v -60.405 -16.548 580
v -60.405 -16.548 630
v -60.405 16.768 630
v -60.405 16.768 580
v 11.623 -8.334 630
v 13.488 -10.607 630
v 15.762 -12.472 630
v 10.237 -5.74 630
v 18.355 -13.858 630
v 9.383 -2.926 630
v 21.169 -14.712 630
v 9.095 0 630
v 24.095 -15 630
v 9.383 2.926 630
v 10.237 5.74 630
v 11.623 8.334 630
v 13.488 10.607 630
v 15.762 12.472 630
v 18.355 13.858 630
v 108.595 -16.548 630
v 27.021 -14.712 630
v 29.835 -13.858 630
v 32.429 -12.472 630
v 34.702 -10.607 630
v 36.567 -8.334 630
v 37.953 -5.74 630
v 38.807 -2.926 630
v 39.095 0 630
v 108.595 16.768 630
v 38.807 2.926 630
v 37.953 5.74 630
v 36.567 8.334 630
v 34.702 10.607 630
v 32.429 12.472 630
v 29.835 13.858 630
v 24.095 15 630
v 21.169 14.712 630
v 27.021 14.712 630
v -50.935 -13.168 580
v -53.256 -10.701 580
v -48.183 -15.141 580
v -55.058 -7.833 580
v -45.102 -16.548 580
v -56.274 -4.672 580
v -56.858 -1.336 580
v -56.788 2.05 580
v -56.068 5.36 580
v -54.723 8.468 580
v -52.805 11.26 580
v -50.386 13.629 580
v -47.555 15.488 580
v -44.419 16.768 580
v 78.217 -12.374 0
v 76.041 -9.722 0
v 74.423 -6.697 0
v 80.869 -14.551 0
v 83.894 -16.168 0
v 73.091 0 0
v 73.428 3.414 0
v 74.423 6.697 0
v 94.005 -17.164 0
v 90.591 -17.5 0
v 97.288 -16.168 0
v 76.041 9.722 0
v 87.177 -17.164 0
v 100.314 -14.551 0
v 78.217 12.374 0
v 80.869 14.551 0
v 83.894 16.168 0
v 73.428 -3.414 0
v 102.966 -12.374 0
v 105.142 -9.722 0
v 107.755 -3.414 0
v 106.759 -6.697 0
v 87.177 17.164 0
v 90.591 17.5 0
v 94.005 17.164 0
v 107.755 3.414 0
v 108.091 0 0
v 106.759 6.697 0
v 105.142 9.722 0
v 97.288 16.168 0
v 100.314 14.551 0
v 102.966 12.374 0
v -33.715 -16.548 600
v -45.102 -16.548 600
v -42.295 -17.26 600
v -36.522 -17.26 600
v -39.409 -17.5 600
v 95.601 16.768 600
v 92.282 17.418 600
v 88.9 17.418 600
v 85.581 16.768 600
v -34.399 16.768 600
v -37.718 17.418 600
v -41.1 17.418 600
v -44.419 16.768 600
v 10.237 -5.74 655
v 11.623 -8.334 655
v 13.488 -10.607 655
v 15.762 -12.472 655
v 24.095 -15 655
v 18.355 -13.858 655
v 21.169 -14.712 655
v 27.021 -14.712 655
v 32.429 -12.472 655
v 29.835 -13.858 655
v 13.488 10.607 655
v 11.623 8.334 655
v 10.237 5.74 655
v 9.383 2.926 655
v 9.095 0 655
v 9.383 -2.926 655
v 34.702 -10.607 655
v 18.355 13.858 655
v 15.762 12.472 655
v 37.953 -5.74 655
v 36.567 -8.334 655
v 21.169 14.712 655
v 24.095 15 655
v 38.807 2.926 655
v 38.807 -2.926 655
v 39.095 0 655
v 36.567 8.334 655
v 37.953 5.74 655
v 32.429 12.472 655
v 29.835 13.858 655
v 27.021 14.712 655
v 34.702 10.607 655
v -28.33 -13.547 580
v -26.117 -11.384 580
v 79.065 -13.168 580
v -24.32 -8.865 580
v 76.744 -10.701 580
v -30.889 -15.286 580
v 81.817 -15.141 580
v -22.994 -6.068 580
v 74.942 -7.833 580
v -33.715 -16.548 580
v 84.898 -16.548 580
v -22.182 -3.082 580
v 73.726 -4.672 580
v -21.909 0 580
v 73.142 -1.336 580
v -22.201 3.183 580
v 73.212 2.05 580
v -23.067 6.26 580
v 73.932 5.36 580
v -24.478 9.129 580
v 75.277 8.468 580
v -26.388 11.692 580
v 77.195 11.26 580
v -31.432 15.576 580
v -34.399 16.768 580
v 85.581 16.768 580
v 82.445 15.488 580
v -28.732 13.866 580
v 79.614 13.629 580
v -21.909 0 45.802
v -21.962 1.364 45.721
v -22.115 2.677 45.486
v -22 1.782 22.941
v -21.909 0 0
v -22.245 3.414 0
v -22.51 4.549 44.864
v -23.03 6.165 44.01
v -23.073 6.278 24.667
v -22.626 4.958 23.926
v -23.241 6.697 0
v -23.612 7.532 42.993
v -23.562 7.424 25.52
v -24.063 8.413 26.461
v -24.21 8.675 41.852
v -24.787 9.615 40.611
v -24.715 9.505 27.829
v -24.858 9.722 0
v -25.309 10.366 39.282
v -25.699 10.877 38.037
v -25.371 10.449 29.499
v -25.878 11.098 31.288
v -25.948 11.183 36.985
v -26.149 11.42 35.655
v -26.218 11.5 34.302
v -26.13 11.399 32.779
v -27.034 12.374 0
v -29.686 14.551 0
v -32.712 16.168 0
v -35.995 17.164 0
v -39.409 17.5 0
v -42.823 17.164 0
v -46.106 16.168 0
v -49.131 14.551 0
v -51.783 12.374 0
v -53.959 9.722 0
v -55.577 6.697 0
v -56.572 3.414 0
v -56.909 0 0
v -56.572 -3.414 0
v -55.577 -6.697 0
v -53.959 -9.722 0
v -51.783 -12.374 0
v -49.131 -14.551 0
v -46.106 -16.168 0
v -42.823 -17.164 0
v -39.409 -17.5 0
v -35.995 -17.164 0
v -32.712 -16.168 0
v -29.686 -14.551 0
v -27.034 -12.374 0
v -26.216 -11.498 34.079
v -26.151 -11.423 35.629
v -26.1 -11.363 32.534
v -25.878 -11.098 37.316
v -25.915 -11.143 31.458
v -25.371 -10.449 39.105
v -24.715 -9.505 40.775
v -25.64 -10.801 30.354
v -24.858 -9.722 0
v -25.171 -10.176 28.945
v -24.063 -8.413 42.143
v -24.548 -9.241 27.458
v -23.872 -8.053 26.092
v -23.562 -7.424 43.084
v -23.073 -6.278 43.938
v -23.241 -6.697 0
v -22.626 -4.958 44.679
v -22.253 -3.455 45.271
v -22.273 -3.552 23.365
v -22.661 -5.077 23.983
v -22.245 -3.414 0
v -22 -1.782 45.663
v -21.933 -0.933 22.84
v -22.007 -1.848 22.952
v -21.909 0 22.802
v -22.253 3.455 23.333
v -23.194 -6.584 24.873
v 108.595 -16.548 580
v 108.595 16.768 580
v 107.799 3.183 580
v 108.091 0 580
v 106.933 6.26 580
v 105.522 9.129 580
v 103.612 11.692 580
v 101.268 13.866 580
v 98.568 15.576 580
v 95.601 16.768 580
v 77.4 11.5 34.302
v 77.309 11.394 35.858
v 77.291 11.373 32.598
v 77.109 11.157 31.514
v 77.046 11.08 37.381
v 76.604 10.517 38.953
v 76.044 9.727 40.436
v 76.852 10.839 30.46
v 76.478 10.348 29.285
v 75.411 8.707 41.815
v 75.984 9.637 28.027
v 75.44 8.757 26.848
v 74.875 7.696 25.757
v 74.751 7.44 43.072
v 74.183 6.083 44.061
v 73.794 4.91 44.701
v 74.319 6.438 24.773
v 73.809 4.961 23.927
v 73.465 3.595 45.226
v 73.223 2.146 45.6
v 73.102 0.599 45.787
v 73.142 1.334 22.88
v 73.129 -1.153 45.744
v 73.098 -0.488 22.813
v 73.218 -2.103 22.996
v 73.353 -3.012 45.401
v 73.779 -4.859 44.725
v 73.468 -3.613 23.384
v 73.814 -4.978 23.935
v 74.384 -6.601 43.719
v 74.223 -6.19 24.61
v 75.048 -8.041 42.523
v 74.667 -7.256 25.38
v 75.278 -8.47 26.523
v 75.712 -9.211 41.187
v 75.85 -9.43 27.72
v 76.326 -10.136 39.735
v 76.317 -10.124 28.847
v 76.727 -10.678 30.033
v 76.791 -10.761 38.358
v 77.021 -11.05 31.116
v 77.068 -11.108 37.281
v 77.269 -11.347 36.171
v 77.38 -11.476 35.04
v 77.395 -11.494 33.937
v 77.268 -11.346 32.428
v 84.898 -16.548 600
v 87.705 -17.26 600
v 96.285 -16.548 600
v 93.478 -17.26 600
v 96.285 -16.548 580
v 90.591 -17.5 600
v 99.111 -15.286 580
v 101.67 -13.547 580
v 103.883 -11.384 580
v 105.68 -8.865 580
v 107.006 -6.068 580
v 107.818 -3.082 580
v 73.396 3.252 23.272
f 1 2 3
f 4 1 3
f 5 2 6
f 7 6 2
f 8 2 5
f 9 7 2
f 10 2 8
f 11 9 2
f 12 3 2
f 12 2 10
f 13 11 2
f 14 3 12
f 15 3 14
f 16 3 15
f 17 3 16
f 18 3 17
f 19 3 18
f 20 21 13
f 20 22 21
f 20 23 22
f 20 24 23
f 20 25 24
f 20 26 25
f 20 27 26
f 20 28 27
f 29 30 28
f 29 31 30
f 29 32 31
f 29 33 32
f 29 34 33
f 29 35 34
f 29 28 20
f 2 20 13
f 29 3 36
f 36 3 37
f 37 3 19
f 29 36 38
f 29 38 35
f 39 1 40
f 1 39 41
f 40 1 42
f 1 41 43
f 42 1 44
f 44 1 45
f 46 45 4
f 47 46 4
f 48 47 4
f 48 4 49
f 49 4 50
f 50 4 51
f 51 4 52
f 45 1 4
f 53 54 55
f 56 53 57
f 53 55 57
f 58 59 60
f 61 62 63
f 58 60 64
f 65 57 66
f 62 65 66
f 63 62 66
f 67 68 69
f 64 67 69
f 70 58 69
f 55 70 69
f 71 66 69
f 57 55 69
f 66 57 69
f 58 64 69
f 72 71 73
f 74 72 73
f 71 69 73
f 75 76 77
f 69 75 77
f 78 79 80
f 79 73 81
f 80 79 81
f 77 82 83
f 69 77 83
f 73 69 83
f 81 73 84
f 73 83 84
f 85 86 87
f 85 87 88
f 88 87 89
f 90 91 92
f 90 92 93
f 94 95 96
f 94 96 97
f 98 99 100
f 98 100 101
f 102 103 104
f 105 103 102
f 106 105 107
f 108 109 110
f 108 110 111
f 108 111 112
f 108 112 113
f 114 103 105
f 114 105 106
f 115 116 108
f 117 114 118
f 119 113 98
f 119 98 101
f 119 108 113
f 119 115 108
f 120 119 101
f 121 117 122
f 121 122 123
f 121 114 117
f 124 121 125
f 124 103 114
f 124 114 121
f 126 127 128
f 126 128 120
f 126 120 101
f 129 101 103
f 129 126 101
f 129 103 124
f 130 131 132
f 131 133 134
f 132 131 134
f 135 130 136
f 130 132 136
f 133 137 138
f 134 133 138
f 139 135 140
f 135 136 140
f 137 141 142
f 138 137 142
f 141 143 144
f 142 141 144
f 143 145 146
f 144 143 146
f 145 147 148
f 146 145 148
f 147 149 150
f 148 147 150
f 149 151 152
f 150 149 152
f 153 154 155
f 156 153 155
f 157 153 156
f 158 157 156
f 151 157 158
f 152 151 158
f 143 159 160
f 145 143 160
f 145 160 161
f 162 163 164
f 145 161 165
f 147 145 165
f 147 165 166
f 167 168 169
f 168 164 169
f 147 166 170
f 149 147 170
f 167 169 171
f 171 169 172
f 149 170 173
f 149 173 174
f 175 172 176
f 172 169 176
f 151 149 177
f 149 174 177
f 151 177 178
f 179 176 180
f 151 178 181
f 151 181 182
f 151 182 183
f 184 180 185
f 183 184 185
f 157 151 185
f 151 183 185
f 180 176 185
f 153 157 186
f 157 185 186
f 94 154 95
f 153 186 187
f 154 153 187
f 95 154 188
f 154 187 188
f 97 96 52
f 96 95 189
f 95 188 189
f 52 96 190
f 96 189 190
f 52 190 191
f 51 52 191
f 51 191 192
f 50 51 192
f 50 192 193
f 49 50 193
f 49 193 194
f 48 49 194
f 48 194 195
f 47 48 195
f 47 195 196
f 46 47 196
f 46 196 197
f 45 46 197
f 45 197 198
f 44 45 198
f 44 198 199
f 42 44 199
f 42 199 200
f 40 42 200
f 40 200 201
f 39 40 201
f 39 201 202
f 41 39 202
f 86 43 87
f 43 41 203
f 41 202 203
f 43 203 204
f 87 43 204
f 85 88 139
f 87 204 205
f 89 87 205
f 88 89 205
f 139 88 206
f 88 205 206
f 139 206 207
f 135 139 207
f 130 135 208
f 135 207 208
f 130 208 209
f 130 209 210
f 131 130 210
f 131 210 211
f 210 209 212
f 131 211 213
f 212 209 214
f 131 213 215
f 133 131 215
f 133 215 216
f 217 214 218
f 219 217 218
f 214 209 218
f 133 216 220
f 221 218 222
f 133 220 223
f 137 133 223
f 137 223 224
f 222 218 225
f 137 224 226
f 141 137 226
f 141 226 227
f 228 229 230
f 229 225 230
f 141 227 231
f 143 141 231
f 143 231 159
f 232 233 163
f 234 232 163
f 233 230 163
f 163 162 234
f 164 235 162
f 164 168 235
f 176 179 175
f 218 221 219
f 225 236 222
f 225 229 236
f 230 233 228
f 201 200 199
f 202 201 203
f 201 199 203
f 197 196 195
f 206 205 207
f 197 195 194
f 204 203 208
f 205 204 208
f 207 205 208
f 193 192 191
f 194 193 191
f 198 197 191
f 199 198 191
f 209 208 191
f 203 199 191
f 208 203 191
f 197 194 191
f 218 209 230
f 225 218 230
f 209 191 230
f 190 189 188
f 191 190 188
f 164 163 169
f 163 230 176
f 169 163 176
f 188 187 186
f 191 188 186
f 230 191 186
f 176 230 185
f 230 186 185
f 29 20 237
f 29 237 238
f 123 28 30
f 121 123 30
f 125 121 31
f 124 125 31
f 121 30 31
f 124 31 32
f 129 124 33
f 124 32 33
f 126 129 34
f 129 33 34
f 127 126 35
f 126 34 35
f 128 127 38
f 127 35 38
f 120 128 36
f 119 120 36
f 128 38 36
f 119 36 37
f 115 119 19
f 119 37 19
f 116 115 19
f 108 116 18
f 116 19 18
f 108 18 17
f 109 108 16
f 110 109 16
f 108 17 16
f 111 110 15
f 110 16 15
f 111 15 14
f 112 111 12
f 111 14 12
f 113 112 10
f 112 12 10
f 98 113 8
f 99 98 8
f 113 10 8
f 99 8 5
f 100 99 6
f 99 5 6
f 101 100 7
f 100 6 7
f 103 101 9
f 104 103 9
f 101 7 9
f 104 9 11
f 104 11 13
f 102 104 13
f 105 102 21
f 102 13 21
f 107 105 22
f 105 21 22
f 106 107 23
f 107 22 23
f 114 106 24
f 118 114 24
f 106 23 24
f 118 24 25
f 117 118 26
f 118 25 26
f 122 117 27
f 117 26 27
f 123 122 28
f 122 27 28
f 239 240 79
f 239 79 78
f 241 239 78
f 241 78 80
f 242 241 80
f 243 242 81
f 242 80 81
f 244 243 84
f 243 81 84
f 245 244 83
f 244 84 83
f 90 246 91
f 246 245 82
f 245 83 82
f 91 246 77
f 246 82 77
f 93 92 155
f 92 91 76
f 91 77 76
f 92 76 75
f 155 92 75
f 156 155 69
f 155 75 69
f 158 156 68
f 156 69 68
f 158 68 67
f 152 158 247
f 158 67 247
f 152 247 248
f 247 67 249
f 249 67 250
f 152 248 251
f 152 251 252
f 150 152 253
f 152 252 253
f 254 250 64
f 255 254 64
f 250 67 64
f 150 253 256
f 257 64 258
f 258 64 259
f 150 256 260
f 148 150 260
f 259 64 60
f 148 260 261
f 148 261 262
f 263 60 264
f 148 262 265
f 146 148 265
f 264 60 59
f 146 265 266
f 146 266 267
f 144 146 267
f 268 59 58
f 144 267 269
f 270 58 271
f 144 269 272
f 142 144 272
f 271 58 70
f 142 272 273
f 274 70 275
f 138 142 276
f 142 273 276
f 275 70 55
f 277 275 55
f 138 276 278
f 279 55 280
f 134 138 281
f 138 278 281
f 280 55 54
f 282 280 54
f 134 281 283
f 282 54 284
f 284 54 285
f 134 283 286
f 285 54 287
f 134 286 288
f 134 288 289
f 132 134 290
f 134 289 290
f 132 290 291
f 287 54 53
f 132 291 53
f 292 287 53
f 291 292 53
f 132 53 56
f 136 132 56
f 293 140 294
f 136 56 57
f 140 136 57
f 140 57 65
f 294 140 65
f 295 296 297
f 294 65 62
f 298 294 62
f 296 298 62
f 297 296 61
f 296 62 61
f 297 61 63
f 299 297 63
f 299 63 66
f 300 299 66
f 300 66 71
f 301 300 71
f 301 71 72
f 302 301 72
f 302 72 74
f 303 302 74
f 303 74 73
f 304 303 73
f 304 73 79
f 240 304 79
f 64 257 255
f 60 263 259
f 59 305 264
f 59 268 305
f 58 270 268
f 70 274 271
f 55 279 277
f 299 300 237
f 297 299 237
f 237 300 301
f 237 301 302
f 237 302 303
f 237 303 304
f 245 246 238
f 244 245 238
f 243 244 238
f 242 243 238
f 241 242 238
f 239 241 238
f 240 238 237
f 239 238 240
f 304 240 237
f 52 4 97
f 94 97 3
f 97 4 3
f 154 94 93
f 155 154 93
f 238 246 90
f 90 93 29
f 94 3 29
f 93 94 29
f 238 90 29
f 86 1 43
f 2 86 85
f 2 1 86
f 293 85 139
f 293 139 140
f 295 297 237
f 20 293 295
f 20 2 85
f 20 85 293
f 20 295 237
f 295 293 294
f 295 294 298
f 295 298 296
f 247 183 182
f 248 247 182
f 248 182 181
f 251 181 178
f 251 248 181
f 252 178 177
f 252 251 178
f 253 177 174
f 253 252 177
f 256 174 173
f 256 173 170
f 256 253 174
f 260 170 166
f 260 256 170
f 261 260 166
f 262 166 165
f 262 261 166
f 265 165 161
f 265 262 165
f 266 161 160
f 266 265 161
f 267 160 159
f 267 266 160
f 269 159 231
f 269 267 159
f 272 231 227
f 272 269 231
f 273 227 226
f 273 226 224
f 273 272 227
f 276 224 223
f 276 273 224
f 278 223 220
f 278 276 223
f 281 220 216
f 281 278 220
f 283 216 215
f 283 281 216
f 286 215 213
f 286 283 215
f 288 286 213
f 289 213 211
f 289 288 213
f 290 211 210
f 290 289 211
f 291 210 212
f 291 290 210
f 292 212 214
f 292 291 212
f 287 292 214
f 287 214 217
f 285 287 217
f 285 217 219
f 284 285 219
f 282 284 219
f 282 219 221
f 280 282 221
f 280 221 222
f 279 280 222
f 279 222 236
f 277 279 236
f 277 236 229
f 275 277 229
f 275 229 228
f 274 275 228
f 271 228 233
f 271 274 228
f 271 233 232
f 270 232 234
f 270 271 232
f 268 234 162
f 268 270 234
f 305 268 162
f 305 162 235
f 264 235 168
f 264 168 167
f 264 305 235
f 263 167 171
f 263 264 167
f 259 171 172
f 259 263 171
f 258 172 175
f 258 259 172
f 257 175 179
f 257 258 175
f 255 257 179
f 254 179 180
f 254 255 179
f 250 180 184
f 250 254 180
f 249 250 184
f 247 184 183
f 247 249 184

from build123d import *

# Parameters (mm, degrees)
F0_R          = 17.5
F1_DEPTH      = 600
F2_R          = 11.5
F3_DEPTH      = 77.4004622785
F3_DEPTH_BACK = 26.2177260049
F5_W          = 169
F5_H          = 33.3154127554
F6_DEPTH      = 50
F7_R          = 15
F8_DEPTH      = 25


with BuildPart() as f1:
    # F0 (on Top) → F1 (new body)
    with BuildSketch(Plane.XY):
        with Locations((-39.4086318632, 0)):
            Circle(F0_R)
    extrude(amount=F1_DEPTH)



with BuildPart() as f1b:
    # F0 (on Top) → F1, piece 2 (new body)
    with BuildSketch(Plane.XY):
        with Locations((90.5913681368, 0)):
            Circle(F0_R)
    extrude(amount=F1_DEPTH)


with BuildPart() as f1_1:
    add(f1.part)

    add(f1b.part)  # F3 merges F1b
    # F2 (on Right) → F3 (join, two sides)
    with BuildSketch(Plane.YZ) as f3_sk:
        with Locations((0, 34.3021339912)):
            Circle(F2_R)
    extrude(amount=F3_DEPTH)
    extrude(f3_sk.sketch, amount=-F3_DEPTH_BACK)

    # F5 (on offset) → F6 (join)
    with BuildSketch(Plane.XY.offset(630)):
        with Locations((24.0950547159, 0.109818764)):
            Rectangle(F5_W, F5_H)
    extrude(amount=-F6_DEPTH)

    # F7 (on face) → F8 (join)
    with BuildSketch(Plane.XY.offset(630)):
        with Locations((24.0950547159, 0)):
            Circle(F7_R)
    extrude(amount=F8_DEPTH)


solid = f1_1.part
